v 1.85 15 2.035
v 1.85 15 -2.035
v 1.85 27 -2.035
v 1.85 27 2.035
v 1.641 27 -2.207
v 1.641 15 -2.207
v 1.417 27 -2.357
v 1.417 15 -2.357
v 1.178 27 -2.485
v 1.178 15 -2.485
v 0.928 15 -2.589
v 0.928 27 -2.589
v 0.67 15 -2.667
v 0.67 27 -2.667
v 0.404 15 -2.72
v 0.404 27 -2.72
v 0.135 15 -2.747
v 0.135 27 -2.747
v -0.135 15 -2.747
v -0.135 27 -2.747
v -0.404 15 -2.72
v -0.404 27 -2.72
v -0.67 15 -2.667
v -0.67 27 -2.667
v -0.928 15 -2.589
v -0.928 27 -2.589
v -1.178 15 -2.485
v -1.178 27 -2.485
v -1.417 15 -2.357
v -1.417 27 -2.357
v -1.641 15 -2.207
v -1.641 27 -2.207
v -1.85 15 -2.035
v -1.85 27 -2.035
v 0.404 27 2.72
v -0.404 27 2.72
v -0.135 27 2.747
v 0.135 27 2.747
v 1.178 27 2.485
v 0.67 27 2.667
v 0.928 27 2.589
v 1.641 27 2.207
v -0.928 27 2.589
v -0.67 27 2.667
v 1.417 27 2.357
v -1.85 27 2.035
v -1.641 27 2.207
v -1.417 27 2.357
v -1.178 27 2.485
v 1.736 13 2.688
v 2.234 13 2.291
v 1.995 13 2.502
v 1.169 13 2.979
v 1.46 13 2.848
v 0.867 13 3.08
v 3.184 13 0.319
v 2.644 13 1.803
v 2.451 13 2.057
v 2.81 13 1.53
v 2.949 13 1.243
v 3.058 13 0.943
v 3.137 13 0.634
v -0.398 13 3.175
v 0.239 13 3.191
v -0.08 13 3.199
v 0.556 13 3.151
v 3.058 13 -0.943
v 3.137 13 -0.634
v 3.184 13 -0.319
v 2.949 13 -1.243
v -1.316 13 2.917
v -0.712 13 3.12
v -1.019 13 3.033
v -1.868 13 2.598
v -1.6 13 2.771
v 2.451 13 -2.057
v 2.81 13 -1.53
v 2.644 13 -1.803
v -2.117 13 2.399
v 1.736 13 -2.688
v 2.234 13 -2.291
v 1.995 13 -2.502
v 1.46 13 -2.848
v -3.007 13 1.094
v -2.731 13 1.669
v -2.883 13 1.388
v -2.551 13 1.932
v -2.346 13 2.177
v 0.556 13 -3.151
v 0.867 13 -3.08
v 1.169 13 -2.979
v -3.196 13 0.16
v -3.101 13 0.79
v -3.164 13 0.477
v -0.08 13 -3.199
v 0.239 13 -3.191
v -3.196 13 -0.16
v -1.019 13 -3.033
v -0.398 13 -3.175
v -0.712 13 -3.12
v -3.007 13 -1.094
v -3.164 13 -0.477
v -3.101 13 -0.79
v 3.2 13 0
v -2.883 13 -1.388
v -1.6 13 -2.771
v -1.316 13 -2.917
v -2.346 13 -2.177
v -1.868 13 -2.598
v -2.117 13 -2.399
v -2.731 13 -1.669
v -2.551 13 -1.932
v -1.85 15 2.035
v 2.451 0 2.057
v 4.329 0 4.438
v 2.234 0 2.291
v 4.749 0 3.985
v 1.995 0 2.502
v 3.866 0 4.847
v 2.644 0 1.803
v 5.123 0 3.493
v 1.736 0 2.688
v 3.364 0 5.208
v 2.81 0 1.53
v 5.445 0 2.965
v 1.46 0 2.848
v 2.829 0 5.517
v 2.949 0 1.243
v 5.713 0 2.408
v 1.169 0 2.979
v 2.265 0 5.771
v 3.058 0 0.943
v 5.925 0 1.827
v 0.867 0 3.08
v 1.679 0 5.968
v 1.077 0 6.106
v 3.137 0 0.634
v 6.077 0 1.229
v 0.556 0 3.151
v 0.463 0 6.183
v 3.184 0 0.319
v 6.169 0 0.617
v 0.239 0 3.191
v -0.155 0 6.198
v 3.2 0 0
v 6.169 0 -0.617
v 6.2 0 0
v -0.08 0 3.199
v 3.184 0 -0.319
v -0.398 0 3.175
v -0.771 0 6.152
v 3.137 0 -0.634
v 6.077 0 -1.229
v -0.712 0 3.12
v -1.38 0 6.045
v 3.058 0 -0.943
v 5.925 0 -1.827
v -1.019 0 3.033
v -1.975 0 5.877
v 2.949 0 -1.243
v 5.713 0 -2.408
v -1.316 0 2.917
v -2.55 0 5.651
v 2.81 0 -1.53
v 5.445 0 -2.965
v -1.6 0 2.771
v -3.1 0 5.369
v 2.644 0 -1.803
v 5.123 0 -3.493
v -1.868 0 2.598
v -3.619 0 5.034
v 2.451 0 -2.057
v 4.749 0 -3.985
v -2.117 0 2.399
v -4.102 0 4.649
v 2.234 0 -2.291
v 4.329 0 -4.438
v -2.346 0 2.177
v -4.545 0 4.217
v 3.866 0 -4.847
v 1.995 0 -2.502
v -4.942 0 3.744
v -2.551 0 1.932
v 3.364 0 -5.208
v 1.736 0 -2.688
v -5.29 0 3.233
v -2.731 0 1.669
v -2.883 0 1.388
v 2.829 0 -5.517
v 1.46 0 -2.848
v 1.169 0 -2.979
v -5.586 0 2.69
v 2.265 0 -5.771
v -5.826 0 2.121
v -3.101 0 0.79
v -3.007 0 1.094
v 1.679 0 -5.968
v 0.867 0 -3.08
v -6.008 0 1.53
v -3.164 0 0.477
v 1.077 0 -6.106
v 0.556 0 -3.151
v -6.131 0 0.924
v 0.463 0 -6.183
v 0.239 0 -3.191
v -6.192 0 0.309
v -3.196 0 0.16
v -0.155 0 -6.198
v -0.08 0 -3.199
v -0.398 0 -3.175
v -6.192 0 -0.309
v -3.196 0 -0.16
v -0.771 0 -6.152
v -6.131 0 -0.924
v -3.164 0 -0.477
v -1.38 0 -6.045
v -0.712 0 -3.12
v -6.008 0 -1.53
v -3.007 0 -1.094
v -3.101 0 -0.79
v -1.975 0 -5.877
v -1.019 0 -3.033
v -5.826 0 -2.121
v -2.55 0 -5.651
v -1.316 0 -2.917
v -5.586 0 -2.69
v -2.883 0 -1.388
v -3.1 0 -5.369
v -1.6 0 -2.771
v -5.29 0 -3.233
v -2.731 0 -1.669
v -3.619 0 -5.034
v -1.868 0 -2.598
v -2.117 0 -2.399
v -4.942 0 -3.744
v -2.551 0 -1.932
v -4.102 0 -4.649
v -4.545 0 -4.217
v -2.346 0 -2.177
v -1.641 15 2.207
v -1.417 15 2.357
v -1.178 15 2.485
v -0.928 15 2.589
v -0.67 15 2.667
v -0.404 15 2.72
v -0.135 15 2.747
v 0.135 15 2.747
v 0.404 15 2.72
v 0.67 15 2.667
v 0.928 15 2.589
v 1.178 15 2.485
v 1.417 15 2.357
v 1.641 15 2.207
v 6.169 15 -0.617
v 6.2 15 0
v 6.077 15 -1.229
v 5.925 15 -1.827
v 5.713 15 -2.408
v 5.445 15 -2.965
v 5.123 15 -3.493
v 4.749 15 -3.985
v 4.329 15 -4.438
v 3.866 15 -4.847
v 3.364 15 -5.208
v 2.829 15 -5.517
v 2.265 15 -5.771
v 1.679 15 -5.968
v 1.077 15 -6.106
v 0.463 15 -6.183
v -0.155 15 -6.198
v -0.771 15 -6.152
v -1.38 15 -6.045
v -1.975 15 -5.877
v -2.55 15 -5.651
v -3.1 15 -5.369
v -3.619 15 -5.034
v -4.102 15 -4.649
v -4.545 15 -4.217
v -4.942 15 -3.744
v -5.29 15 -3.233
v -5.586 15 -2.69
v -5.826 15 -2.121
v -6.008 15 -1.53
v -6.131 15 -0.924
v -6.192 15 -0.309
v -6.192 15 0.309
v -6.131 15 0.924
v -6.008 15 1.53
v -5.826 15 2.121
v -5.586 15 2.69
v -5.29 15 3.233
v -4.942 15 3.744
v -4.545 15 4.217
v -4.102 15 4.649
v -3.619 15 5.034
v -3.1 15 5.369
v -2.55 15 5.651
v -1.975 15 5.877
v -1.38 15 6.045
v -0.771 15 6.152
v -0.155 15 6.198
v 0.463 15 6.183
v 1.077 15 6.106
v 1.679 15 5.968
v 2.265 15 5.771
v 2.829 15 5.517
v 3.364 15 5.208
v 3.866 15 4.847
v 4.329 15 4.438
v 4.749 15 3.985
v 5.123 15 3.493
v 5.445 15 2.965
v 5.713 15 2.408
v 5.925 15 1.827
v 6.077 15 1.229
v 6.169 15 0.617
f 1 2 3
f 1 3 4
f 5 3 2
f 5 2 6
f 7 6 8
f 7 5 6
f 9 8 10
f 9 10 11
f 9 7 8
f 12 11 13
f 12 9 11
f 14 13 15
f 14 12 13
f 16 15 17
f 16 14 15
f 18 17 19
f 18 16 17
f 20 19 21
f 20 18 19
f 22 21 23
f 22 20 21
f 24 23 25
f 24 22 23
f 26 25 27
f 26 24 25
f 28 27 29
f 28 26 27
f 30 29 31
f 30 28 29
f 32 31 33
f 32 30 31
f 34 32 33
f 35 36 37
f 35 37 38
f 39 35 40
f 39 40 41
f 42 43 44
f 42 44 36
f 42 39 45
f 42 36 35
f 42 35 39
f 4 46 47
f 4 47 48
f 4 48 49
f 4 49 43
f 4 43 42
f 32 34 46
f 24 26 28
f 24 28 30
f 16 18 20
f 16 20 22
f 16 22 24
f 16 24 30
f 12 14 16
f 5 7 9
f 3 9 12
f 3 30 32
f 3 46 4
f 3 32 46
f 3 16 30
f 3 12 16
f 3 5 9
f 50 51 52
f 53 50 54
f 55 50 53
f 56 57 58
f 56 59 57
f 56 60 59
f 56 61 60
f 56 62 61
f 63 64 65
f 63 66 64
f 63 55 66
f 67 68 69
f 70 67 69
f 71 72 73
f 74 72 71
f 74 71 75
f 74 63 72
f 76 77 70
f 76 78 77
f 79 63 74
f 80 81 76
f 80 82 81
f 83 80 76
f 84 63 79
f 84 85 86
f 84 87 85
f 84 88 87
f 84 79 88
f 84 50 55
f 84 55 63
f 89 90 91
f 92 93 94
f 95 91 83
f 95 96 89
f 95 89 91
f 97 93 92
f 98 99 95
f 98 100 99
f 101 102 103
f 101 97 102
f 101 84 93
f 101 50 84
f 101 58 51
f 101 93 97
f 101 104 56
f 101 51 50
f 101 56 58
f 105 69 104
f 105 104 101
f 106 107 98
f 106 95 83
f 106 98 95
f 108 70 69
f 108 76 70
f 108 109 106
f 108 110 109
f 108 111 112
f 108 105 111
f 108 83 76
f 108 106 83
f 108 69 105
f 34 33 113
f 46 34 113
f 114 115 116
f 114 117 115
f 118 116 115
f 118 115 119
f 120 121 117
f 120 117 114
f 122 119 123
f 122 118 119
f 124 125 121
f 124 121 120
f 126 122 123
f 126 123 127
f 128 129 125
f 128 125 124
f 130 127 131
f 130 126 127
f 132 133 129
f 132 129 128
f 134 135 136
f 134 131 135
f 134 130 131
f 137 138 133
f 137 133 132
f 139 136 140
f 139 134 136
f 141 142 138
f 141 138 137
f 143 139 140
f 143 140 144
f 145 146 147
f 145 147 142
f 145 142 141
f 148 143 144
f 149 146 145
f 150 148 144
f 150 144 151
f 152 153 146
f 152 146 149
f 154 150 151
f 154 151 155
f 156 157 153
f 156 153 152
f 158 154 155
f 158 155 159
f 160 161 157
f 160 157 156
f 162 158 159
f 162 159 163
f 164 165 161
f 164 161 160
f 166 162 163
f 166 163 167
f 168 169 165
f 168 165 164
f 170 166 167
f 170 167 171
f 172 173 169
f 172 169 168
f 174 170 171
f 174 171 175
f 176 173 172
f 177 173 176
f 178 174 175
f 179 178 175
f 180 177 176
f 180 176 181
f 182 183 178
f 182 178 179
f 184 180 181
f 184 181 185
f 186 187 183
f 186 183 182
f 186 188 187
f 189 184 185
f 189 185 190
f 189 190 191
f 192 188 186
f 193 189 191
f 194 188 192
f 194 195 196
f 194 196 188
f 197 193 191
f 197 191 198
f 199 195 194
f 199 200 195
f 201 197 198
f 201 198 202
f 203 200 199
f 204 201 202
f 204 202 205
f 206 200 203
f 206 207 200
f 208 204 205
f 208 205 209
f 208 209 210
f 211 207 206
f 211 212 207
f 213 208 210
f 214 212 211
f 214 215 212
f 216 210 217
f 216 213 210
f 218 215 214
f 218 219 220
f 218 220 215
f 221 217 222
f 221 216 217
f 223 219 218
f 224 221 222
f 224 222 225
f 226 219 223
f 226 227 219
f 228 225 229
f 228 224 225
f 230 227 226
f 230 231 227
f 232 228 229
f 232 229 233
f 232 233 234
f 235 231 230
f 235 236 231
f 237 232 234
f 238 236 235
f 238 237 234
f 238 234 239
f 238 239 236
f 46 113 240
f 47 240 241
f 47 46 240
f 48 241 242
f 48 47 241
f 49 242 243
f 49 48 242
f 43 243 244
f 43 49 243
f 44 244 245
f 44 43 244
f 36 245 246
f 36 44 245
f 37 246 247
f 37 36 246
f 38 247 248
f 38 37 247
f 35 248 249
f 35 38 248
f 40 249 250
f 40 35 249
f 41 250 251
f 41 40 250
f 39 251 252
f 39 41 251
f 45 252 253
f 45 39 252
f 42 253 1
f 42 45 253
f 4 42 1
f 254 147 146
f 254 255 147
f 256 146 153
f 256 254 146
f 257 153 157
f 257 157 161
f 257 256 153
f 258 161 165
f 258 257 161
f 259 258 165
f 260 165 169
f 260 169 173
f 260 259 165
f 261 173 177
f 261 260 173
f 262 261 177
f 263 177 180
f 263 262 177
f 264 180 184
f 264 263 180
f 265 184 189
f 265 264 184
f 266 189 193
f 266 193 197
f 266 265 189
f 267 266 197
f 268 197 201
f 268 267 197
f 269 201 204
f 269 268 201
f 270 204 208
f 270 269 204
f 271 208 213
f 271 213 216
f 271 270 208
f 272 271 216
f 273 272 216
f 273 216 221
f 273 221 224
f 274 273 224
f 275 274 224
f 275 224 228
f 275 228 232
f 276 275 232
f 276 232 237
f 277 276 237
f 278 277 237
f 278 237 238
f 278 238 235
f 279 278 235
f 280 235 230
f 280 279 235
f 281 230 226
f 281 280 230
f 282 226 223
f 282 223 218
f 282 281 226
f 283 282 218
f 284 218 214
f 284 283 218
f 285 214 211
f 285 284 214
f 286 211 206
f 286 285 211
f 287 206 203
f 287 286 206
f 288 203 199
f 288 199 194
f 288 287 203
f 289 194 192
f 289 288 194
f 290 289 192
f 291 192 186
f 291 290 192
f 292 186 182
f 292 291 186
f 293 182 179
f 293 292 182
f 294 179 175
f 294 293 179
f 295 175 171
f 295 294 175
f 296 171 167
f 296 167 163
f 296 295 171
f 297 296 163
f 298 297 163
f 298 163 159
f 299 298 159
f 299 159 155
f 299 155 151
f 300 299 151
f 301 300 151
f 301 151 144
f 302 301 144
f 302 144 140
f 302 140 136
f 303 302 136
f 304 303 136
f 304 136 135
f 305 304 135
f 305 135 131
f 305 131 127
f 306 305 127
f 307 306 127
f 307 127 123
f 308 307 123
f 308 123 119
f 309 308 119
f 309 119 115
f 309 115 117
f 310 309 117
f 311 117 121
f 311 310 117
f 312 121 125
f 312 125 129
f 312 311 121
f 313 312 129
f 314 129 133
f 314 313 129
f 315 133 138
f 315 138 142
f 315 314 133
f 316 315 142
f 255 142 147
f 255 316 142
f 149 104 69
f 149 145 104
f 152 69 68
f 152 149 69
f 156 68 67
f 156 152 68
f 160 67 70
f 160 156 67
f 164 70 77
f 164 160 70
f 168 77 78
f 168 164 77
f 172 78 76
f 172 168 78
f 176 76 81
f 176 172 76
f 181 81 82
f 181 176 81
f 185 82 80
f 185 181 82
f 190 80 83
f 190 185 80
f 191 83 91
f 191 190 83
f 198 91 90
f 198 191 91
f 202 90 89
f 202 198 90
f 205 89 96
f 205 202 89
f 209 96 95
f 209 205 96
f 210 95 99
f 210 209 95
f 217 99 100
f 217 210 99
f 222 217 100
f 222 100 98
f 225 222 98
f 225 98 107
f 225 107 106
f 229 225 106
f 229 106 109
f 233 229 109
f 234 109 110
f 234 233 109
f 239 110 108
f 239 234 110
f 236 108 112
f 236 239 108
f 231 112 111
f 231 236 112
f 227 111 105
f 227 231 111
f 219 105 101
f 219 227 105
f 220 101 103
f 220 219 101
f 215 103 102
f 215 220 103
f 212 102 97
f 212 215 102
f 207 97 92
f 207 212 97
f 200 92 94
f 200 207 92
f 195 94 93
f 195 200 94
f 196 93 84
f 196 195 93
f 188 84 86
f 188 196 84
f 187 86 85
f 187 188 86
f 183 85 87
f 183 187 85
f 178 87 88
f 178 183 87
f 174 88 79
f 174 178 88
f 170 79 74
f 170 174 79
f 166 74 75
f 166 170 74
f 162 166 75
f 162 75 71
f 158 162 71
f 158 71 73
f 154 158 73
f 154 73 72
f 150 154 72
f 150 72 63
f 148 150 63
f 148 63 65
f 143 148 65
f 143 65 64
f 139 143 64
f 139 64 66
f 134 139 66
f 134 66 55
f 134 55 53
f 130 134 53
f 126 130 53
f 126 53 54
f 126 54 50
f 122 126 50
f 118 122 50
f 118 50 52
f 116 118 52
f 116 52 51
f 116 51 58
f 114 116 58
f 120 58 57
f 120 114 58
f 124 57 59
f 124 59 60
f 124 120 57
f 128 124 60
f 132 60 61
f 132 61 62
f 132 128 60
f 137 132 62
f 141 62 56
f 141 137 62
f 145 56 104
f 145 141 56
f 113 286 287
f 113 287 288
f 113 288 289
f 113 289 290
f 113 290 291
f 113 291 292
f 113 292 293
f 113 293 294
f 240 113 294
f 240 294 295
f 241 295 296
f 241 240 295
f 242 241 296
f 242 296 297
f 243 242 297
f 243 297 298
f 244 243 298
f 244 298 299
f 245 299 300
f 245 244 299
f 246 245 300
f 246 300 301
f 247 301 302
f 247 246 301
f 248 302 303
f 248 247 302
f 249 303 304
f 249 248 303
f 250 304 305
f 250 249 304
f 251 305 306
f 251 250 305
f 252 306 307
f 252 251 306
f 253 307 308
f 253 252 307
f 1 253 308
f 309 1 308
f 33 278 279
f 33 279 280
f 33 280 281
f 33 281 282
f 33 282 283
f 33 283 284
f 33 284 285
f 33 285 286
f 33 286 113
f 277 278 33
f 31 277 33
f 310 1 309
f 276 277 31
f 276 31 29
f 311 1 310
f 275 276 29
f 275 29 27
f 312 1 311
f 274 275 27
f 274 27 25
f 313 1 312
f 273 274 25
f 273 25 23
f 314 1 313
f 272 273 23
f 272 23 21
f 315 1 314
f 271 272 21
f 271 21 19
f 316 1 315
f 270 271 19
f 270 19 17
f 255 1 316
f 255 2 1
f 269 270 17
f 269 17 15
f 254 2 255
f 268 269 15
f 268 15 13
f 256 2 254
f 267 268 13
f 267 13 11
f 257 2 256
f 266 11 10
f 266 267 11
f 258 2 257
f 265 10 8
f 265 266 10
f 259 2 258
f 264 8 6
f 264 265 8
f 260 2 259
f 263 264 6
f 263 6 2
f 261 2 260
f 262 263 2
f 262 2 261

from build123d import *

# Parameters (mm, degrees)
CORTAR_EXTRUIR1_DEPTH = 18.374694242


with BuildPart() as part:
    # Croquis3 → Revolución1 (revolve)
    with BuildSketch(Plane.XY):
        Polygon((3.2, 0), (6.2, 0), (6.2, 15), (2.75, 15), (2.75, 27), (0, 27), (0, 13), (3.2, 13), align=None)
    revolve(axis=Axis((0, -169.632312065, 0), (0, 1, 0)))

    # Croquis4 → Cortar-Extruir1 (cut, through all)
    with BuildSketch(Plane(origin=(0, 15, 0), x_dir=(1, 0, 0), z_dir=(0, 1, 0))):
        with BuildLine():
            Line((1.85, 2.034698995), (1.85, -2.034698995))
            ThreePointArc((1.85, -2.034698995), (2.75, 0), (1.85, 2.034698995))
        make_face()
        with BuildLine():
            Line((-1.85, 2.034698995), (-1.85, -2.034698995))
            ThreePointArc((-1.85, -2.034698995), (-2.75, 0), (-1.85, 2.034698995))
        make_face()
    extrude(amount=CORTAR_EXTRUIR1_DEPTH, mode=Mode.SUBTRACT)


solid = part.part
